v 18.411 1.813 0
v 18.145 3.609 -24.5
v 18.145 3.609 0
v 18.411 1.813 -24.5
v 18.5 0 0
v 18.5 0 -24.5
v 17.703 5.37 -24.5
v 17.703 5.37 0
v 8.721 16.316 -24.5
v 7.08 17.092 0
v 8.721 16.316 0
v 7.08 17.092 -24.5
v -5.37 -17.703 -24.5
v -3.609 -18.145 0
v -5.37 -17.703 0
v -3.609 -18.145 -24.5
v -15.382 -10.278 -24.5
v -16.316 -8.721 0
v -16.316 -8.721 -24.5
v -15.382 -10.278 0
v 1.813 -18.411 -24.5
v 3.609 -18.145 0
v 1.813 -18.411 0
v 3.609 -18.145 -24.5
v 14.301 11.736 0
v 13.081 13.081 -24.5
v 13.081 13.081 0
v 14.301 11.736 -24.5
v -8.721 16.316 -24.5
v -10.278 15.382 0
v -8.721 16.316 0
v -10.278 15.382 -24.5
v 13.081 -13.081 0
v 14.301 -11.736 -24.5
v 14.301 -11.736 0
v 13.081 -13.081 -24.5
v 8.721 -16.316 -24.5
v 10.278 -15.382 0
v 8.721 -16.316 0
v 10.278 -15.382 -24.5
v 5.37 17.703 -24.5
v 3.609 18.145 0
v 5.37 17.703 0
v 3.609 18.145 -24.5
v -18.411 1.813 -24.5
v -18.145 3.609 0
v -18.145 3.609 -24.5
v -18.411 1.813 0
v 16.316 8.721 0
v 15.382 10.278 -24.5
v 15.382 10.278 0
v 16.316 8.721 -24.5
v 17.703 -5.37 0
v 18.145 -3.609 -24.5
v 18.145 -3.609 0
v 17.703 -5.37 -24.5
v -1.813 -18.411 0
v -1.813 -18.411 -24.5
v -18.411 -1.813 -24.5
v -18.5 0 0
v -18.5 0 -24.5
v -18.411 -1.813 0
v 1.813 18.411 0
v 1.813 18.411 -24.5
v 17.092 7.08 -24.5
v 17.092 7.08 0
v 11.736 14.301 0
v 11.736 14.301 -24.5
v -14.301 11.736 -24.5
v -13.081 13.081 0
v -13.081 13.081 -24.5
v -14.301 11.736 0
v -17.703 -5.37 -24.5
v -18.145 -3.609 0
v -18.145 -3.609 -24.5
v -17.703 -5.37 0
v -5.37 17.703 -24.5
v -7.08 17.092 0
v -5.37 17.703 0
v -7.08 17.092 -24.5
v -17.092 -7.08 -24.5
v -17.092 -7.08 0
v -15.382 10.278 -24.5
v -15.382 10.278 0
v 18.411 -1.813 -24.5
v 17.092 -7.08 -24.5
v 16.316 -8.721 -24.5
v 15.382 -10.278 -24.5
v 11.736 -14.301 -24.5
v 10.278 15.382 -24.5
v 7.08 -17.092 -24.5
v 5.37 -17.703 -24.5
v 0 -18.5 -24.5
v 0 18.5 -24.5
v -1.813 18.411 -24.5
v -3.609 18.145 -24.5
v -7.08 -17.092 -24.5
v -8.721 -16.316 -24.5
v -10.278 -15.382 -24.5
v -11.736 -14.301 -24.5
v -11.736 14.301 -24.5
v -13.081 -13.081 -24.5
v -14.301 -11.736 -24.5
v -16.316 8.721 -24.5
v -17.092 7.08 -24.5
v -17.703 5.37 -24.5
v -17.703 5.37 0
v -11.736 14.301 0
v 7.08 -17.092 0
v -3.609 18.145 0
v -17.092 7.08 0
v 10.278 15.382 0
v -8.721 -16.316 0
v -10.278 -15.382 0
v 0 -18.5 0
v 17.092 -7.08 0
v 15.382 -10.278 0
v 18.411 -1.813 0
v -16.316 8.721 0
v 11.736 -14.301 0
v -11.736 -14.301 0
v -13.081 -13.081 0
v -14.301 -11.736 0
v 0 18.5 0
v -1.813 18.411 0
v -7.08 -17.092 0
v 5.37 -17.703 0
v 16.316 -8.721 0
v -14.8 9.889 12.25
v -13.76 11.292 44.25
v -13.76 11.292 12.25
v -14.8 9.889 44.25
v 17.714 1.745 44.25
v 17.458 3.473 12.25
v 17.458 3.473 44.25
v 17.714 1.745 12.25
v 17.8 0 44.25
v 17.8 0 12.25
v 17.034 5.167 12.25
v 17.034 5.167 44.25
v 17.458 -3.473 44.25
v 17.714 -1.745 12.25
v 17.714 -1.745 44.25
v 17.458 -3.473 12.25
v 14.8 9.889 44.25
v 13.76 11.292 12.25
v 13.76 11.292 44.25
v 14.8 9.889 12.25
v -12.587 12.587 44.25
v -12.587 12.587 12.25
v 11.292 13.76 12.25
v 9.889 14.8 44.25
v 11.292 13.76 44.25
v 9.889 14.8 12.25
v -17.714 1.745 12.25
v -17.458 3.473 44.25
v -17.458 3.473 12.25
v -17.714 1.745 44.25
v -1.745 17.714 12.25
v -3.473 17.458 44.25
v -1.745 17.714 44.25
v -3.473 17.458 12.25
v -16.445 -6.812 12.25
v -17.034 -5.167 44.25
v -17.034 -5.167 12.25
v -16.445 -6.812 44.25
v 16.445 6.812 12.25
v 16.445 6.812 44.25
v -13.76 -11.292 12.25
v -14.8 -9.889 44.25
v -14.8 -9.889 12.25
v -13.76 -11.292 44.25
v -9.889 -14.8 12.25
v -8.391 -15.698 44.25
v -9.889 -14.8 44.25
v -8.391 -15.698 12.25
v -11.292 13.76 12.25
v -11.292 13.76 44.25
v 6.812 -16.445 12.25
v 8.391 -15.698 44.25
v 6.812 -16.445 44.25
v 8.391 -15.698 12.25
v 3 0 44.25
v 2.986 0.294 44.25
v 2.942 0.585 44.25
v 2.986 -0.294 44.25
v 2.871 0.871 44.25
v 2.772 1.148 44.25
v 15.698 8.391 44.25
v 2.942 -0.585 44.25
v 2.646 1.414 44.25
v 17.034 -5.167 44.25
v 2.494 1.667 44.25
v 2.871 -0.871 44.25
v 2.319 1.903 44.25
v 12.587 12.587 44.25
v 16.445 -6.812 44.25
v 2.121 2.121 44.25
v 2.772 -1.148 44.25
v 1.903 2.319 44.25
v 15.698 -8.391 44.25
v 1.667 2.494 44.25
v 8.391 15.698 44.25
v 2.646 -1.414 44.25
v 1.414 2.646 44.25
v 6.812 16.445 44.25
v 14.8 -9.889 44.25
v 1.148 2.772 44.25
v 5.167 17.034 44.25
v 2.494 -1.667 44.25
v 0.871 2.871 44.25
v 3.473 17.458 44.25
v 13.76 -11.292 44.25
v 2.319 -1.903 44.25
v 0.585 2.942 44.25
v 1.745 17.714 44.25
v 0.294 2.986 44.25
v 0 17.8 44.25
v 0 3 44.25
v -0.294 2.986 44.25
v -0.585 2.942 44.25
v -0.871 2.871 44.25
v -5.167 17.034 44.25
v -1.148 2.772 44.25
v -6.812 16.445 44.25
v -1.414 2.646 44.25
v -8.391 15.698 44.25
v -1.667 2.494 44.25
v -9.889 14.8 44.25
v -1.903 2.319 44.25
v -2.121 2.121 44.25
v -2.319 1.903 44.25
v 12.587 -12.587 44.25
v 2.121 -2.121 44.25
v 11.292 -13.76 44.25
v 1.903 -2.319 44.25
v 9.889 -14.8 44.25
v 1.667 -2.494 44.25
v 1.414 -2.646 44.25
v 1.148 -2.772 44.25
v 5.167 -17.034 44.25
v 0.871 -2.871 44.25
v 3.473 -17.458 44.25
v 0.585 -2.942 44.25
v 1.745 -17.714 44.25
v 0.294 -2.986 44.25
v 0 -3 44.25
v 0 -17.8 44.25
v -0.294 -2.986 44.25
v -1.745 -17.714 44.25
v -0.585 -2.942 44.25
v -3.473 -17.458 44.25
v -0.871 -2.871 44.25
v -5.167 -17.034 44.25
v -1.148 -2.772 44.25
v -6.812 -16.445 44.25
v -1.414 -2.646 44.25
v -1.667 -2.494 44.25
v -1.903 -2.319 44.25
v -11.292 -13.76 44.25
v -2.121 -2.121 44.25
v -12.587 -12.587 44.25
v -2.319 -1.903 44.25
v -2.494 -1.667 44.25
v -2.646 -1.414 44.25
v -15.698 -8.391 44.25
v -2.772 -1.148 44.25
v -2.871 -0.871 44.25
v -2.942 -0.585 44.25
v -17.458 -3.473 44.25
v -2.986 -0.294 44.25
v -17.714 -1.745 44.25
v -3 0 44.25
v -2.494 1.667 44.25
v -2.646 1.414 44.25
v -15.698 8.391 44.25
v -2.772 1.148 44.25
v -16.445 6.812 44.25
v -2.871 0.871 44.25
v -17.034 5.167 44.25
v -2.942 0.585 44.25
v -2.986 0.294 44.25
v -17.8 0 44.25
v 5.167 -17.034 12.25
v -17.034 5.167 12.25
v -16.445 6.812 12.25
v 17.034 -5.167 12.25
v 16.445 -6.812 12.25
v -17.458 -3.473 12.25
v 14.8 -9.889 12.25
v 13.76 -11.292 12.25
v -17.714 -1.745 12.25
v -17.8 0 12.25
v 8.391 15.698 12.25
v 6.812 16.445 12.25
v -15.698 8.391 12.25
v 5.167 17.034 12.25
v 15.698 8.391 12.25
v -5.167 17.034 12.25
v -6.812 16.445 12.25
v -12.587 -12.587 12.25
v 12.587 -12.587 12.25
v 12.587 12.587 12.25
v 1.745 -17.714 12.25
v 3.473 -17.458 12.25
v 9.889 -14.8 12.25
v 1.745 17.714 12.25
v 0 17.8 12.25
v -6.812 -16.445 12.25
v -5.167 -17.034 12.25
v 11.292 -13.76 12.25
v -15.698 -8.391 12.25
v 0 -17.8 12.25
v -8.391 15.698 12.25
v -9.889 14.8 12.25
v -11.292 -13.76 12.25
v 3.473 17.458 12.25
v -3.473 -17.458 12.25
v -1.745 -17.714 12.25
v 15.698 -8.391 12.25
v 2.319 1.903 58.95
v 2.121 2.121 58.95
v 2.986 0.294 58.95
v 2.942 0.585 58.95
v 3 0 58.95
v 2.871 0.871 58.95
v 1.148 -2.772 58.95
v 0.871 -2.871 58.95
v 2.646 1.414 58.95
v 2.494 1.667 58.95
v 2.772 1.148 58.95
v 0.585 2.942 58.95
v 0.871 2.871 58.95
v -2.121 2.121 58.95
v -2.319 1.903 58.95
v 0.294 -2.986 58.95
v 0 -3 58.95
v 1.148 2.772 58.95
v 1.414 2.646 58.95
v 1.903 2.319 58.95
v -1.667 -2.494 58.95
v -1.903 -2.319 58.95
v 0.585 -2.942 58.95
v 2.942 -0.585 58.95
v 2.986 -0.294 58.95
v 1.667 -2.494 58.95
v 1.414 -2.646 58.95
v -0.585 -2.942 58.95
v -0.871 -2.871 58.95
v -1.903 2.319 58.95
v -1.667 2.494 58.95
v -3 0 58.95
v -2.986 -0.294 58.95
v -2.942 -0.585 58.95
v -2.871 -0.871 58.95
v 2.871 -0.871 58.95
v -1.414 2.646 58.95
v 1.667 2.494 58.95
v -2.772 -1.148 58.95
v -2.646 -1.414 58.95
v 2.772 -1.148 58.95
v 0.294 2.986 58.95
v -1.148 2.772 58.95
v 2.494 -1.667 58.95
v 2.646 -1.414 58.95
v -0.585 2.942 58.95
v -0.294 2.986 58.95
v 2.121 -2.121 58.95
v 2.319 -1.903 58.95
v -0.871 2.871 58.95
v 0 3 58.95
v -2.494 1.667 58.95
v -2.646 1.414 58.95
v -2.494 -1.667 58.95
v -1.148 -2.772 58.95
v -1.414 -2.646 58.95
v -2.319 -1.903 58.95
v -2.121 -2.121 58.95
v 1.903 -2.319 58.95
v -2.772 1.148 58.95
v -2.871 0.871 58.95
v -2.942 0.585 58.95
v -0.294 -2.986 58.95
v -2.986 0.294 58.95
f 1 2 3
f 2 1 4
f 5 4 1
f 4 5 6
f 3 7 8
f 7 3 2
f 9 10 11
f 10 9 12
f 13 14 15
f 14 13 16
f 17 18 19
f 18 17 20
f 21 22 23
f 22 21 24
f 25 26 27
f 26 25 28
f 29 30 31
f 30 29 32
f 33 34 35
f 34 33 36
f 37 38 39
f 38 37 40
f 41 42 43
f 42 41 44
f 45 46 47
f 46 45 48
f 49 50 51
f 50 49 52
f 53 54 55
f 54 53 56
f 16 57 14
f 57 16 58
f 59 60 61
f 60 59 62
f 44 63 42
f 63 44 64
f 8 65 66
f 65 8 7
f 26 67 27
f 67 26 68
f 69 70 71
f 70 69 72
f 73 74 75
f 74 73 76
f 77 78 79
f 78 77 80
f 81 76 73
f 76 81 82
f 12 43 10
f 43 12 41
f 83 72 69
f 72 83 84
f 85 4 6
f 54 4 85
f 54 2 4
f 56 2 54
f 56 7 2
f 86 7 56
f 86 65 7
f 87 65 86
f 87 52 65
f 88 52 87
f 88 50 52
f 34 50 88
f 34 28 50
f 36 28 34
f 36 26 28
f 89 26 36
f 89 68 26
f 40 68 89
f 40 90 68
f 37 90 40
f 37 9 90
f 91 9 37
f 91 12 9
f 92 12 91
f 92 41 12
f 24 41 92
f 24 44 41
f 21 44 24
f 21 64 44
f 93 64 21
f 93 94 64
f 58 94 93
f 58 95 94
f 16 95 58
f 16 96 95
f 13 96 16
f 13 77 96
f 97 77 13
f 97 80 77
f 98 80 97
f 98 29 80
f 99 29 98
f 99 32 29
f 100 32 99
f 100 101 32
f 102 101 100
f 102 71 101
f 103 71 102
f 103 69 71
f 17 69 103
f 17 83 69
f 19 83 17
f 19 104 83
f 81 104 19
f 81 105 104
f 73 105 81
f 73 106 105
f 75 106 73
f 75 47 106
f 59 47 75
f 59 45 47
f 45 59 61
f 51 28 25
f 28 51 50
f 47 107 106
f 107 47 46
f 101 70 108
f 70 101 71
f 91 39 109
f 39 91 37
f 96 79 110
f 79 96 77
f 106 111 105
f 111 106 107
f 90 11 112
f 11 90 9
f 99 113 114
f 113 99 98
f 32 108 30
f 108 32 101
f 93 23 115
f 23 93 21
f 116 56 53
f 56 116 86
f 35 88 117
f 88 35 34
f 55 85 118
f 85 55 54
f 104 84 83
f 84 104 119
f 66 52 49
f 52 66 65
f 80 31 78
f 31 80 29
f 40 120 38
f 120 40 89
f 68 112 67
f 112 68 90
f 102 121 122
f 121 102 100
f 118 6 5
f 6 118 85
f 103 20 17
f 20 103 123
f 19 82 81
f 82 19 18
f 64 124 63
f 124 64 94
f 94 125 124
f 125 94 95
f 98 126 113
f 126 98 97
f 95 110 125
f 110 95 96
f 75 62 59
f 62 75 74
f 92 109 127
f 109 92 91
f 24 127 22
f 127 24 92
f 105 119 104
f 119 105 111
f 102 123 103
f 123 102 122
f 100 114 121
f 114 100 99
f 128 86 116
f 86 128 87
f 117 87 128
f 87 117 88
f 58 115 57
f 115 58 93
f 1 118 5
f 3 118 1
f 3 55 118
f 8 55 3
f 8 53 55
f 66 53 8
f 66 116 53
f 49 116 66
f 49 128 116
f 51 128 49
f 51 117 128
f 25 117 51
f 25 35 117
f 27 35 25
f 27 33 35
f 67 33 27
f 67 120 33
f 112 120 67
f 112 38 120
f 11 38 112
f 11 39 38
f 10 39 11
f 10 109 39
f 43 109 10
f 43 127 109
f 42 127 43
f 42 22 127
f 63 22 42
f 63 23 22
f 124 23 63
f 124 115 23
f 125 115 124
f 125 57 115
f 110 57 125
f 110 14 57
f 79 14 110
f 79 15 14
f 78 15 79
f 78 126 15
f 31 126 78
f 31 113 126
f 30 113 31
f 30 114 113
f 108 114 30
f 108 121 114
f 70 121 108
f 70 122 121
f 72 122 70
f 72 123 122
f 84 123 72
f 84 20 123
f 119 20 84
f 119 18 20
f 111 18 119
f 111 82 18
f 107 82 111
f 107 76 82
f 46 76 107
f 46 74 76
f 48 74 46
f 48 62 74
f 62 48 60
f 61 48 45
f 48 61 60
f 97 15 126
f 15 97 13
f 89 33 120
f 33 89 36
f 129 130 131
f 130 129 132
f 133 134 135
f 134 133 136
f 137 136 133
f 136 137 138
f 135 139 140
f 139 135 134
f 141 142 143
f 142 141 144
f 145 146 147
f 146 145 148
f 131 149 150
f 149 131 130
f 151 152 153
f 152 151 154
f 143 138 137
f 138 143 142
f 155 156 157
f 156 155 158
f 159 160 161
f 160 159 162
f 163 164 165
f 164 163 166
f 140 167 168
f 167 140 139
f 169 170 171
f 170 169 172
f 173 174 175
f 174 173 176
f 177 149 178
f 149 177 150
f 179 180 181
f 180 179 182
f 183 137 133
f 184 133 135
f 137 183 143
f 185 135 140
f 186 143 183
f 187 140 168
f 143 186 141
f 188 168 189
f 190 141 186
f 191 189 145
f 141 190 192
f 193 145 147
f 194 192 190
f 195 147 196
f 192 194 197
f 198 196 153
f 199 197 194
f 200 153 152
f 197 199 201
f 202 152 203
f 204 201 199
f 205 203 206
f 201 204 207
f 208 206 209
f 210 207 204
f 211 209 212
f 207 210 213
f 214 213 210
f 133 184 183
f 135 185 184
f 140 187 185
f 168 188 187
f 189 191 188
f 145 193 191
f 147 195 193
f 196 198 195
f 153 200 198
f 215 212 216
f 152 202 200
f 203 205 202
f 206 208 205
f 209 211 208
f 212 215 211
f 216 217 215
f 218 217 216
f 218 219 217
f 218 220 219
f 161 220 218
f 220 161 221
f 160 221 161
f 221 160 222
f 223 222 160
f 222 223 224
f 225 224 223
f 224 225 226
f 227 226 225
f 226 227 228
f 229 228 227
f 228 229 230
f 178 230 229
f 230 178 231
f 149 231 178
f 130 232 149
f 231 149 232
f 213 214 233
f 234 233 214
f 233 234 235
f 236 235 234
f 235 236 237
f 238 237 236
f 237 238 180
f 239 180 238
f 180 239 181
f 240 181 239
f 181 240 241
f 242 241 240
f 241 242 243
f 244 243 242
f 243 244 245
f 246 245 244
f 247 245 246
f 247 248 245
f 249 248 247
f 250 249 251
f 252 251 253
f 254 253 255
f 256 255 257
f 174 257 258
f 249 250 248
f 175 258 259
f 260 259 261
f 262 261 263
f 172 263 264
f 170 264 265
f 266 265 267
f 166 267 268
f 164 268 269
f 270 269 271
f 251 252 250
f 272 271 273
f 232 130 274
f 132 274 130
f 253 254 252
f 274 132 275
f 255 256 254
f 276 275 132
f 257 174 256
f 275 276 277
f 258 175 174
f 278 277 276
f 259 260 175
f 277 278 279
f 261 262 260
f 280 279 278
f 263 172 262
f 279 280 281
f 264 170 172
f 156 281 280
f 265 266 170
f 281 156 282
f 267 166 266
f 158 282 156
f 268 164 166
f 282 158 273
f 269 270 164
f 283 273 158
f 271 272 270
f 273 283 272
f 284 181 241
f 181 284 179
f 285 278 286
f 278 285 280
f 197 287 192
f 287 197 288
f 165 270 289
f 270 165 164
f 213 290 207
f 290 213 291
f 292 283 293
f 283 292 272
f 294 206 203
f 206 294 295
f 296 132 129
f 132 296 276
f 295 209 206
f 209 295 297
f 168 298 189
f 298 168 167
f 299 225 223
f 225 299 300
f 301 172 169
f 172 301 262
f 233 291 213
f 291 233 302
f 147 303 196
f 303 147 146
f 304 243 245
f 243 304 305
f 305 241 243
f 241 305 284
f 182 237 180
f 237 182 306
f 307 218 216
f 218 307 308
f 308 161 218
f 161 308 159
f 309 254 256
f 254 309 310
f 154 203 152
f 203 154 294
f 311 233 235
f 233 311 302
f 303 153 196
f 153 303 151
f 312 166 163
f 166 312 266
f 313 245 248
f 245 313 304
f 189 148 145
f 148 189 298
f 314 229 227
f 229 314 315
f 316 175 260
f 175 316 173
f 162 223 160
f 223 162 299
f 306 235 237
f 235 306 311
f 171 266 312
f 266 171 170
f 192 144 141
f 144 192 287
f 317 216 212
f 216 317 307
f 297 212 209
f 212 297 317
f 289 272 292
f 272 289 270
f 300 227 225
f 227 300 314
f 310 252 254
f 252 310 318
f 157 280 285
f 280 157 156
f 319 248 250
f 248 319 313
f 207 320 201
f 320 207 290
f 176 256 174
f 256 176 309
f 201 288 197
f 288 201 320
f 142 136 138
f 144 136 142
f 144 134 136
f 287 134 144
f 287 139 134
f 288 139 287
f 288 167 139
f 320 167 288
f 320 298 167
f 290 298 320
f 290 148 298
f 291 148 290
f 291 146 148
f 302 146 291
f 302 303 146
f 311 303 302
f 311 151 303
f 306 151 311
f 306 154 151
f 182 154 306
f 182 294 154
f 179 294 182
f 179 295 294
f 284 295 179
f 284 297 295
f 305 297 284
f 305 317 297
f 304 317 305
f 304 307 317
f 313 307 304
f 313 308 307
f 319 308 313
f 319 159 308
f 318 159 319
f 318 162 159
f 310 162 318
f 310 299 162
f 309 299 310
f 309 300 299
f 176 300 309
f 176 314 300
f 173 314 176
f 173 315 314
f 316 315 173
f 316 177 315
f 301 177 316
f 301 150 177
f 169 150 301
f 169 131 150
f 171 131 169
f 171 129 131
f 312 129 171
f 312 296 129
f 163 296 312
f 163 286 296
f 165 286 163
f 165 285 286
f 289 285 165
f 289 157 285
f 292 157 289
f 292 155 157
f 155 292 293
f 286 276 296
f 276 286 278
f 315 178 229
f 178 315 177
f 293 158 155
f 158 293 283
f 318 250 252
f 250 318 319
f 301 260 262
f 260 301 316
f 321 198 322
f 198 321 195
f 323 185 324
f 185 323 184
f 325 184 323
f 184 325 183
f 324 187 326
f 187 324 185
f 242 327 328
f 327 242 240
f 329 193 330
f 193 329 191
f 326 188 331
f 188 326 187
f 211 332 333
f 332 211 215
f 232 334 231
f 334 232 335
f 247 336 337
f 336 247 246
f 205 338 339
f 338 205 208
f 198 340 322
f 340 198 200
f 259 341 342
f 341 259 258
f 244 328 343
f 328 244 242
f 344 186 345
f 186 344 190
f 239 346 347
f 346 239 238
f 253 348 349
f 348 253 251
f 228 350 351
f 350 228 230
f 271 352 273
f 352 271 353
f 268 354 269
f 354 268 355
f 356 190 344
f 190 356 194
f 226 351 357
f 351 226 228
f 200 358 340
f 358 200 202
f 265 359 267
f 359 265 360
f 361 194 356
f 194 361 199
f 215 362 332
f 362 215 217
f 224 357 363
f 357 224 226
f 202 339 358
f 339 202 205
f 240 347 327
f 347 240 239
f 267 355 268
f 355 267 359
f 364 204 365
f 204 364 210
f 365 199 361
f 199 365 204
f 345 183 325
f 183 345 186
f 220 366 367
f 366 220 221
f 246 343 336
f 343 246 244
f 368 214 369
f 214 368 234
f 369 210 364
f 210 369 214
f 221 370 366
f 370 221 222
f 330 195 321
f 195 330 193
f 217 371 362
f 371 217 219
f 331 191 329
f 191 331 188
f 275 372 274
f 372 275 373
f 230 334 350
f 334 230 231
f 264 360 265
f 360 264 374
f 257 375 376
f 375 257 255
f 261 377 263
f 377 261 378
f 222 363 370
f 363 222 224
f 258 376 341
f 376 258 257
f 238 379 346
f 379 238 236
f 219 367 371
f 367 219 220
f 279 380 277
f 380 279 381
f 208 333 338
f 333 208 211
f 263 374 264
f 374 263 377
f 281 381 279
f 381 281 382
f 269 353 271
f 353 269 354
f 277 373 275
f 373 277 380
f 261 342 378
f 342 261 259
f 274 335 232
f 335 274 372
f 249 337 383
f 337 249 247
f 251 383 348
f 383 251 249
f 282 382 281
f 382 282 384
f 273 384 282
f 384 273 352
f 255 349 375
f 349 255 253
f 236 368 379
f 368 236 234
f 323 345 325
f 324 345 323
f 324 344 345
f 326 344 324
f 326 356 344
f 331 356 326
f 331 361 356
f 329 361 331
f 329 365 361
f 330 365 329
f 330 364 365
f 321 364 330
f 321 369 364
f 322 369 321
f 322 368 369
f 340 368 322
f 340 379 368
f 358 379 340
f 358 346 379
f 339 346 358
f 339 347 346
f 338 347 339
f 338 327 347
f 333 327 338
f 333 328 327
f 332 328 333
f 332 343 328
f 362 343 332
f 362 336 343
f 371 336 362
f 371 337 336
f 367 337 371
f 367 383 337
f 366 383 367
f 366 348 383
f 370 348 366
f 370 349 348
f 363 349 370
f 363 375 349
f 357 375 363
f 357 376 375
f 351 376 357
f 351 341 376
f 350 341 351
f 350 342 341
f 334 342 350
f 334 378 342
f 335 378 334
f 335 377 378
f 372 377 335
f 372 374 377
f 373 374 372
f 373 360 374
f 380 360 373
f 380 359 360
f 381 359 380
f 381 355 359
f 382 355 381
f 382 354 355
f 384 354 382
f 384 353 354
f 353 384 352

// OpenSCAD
$fn = 64;

module gearbox() {
    cylinder(d = 37, h = 24.5, center = true);
}

module motor() {
    cylinder(d = 35.6, h = 32, center = true);
}

module shaft() {
    cylinder(d = 6, h = 14.7, center = true);
}

translate([0, 0, -24.5/2])
gearbox();

translate([0, 0, 24.5/2 + 32/2])
motor();

translate([0, 0, 24.5/2 + 32 + 14.7/2])
shaft();
